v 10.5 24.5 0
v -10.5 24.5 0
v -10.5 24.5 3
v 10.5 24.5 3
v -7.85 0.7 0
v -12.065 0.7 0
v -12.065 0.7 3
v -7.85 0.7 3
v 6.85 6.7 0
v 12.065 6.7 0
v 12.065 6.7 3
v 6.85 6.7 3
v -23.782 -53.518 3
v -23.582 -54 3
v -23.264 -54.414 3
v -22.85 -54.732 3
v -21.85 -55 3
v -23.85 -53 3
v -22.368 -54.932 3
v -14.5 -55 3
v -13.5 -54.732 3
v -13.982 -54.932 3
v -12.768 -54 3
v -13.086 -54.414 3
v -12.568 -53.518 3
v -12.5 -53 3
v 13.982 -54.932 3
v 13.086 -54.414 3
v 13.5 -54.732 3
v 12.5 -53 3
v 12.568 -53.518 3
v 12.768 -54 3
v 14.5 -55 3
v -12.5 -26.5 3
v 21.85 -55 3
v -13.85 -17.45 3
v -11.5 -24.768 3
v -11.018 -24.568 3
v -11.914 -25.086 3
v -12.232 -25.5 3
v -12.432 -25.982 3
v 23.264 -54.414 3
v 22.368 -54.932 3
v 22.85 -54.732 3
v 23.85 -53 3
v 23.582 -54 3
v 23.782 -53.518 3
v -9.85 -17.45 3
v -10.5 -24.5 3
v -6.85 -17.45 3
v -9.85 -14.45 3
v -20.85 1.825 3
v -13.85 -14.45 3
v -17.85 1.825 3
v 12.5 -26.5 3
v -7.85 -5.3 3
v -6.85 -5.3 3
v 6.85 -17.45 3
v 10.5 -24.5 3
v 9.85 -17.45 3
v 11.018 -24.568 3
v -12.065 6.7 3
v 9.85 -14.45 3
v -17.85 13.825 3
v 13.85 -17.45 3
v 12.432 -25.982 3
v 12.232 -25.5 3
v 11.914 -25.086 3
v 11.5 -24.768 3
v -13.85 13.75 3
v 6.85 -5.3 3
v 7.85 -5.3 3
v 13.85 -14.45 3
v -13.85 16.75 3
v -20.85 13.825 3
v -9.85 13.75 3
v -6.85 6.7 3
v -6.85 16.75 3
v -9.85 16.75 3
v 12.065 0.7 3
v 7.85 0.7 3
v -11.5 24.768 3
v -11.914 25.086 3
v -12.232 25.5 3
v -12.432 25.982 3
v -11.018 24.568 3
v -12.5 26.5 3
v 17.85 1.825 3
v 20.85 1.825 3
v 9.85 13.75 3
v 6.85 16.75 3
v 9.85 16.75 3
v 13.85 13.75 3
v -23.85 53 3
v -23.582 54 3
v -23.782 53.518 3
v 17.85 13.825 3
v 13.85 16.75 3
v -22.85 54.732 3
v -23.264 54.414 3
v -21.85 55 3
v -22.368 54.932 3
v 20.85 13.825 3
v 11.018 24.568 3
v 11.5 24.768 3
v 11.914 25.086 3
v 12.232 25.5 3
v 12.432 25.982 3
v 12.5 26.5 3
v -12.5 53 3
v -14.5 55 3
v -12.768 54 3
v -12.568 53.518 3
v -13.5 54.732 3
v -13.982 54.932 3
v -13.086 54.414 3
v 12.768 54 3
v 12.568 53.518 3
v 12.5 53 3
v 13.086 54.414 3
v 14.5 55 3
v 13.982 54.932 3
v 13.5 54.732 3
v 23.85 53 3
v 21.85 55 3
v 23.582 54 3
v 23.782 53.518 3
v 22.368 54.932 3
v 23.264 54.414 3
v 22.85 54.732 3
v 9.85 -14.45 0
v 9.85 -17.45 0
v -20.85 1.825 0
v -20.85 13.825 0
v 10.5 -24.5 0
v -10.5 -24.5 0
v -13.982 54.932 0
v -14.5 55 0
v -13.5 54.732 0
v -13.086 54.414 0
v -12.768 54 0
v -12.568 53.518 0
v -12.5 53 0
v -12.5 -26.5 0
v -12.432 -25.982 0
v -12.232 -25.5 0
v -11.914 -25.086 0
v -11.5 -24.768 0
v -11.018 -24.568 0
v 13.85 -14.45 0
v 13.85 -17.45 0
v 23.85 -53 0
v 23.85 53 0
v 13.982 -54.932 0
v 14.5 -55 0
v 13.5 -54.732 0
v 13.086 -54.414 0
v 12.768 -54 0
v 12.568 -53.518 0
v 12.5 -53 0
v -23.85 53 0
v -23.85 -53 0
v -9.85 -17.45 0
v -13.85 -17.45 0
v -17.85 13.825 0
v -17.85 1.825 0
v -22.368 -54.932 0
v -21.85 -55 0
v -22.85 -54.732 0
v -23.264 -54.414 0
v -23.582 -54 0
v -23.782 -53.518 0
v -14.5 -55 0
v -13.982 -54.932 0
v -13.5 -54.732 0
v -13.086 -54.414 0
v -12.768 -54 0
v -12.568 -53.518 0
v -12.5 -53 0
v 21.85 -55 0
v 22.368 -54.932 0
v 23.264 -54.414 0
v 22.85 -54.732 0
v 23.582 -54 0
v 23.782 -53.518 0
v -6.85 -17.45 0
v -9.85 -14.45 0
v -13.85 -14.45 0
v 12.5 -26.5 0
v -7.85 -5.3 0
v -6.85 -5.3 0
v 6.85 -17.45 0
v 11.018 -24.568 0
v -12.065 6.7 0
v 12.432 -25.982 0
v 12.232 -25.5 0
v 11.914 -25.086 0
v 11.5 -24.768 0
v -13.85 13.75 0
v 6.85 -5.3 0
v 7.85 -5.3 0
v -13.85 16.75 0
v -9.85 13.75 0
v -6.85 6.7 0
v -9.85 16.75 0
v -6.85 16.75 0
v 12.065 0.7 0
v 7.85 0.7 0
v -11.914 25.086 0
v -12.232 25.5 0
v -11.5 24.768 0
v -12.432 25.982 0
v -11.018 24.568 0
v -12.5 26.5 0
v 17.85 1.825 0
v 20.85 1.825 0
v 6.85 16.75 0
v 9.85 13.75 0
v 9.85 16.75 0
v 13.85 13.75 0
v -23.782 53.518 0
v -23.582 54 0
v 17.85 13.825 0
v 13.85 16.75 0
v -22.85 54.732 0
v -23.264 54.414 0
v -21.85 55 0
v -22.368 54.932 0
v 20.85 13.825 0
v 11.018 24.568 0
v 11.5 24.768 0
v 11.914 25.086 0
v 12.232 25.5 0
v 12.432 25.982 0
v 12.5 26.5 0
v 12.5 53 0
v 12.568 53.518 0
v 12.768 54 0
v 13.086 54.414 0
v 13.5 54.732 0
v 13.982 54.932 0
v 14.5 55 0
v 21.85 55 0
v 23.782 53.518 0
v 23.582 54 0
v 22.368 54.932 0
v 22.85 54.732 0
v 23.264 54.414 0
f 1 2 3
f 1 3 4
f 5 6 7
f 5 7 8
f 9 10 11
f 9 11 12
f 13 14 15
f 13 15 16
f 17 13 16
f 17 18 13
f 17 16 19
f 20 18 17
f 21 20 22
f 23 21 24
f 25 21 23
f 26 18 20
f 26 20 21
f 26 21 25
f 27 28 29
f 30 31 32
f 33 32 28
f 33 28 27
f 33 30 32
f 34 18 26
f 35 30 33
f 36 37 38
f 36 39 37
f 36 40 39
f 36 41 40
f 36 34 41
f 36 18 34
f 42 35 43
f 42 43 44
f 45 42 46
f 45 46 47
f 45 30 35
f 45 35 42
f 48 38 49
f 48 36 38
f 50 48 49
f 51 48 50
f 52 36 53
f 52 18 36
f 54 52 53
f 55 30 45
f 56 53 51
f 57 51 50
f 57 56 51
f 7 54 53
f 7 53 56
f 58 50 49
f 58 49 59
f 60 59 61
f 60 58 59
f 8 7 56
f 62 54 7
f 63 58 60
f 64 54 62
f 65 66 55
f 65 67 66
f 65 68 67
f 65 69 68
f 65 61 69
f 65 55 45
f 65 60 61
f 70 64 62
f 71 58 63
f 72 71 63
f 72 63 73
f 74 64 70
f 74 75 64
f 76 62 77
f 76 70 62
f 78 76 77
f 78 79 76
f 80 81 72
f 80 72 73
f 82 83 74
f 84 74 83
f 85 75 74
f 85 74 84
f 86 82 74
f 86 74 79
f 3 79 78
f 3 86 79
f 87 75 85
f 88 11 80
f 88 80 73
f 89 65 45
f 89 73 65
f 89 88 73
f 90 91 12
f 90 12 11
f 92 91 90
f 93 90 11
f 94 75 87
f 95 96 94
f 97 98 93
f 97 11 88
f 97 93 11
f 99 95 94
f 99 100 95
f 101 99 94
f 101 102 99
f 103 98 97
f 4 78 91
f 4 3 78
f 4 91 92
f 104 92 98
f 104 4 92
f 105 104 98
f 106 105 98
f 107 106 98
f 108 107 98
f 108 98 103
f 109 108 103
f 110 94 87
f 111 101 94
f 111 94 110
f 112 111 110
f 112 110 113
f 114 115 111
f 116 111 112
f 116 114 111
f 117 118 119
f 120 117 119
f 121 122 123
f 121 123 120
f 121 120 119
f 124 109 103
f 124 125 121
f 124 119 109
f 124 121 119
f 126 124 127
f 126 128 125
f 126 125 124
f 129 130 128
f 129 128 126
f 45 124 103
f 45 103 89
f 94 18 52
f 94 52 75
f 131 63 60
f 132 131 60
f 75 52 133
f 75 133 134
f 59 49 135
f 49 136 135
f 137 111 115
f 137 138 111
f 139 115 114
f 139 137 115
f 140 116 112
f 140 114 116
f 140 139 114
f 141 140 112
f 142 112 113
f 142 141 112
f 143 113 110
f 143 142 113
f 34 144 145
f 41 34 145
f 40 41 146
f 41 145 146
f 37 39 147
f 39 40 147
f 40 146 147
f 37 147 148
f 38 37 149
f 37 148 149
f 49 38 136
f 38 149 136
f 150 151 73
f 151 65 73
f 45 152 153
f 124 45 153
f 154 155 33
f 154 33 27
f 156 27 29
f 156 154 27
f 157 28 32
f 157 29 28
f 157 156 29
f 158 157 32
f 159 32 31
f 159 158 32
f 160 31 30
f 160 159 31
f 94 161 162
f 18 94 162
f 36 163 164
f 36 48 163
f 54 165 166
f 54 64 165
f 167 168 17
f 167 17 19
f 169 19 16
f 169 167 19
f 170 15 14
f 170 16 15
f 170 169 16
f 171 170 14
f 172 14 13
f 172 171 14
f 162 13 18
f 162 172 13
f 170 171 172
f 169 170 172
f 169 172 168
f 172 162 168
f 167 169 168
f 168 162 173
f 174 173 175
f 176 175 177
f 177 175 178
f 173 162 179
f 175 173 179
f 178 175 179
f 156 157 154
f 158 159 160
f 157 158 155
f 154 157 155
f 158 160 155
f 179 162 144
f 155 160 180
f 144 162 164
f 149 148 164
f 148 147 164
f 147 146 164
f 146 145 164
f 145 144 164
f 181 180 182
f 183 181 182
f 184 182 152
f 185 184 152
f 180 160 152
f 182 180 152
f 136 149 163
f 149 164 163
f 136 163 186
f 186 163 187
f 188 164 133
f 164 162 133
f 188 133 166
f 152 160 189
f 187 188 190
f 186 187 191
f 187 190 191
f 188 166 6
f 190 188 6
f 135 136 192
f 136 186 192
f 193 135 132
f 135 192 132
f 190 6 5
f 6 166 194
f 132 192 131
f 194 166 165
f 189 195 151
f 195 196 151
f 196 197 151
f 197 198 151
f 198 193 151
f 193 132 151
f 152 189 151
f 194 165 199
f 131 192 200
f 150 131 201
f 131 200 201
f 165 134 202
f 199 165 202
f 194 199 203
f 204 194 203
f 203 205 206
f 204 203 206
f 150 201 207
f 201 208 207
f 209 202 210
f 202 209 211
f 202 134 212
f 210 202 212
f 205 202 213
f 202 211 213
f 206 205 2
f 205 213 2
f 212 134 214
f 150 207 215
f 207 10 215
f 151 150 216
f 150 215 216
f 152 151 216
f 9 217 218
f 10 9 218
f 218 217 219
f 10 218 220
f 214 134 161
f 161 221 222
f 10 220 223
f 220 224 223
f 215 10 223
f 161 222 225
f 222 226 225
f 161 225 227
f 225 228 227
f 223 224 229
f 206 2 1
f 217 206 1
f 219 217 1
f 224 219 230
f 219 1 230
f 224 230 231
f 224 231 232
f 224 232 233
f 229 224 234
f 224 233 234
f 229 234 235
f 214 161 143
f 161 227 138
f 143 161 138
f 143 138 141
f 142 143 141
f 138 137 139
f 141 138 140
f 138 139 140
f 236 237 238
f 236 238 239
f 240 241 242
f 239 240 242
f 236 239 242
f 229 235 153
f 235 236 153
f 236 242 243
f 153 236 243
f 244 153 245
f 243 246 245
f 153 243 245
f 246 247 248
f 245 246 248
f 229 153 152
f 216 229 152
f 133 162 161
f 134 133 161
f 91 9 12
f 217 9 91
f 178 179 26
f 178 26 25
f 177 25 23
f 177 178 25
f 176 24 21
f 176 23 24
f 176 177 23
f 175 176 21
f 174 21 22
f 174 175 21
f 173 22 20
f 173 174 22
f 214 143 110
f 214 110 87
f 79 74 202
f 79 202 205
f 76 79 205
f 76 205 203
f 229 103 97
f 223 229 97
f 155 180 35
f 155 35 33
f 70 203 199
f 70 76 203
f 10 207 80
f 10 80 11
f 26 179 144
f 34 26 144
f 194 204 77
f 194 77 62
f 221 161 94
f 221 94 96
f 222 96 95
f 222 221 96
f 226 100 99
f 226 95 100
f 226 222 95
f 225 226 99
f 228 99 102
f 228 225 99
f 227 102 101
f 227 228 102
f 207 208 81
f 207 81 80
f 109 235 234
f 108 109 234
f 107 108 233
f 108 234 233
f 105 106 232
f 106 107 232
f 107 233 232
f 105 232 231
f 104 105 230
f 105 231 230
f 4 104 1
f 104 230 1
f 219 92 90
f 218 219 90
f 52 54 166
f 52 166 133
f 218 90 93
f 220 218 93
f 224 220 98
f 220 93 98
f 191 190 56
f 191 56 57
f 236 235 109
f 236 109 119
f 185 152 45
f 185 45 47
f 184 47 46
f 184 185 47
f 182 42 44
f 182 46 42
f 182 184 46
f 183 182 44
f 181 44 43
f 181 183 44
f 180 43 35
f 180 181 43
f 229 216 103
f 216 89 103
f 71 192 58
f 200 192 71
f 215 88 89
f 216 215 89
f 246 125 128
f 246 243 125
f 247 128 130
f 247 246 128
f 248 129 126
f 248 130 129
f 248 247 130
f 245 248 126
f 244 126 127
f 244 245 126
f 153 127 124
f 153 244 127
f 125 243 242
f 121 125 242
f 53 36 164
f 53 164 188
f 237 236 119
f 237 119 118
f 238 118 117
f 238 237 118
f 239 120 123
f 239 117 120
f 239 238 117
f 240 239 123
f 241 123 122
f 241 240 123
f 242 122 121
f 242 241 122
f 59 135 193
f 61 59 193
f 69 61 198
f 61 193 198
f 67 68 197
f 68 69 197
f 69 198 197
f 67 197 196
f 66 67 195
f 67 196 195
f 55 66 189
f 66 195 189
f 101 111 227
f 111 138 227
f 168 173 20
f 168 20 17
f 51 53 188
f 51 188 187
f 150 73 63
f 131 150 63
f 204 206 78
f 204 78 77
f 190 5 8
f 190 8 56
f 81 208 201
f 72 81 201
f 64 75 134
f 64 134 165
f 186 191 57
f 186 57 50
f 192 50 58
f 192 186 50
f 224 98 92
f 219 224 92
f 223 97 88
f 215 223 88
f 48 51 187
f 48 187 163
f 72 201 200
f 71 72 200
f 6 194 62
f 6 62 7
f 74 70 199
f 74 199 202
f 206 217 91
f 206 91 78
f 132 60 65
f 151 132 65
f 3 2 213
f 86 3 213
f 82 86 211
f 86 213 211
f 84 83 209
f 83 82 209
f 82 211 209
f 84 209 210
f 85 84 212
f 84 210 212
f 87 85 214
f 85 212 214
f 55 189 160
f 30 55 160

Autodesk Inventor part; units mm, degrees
ref_plane "YZ Plane" through (0, 0, 0) normal (1, 0, 0) x (0, 1, 0)
ref_plane "XZ Plane" through (0, 0, 0) normal (0, 1, 0) x (-1, 0, 0)
ref_plane "XY Plane" through (0, 0, 0) normal (0, 0, 1) x (1, 0, 0)
sketch "草圖1" plane through (0, 0, 0) normal (0, 0, 1) x (1, 0, 0)
  line L0 (-23.85, -55) -> (23.85, 55) construction
  line L1 (23.85, -55) -> (-23.85, 55) construction
  line L2 (0, 127.5618) -> (0, -161.5218) construction
  line L3 (-23.85, 53) -> (-23.85, -53)
  line L4 (23.85, -53) -> (23.85, 53)
  line L5 (-10.5, 24.5) -> (10.5, 24.5)
  line L6 (12.5, 26.5) -> (12.5, 53)
  line L7 (-12.5, 53) -> (-12.5, 26.5)
  line L8 (-12.5, 24.5) -> (12.5, 55) construction
  line L9 (12.5, 24.5) -> (-12.5, 55) construction
  line L10 (21.85, 55) -> (14.5, 55)
  line L11 (-14.5, 55) -> (-21.85, 55)
  arc A0 (-12.5, 53) -> (-14.5, 55) centre (-14.5, 53) ccw
  arc A1 (14.5, 55) -> (12.5, 53) centre (14.5, 53) ccw
  arc A2 (-12.5, 26.5) -> (-10.5, 24.5) centre (-10.5, 26.5) ccw
  arc A3 (10.5, 24.5) -> (12.5, 26.5) centre (10.5, 26.5) ccw
  arc A4 (-21.85, 55) -> (-23.85, 53) centre (-21.85, 53) ccw
  arc A5 (23.85, 53) -> (21.85, 55) centre (21.85, 53) ccw
  line L12 (-82.8249, 0) -> (86.4934, 0) construction
  line L13 (-10.5, -24.5) -> (10.5, -24.5)
  line L14 (12.5, -26.5) -> (12.5, -53)
  line L15 (-12.5, -53) -> (-12.5, -26.5)
  line L16 (-12.5, -24.5) -> (12.5, -55) construction
  line L17 (12.5, -24.5) -> (-12.5, -55) construction
  line L18 (21.85, -55) -> (14.5, -55)
  line L19 (-14.5, -55) -> (-21.85, -55)
  arc A6 (-14.5, -55) -> (-12.5, -53) centre (-14.5, -53) ccw
  arc A7 (12.5, -53) -> (14.5, -55) centre (14.5, -53) ccw
  arc A8 (-10.5, -24.5) -> (-12.5, -26.5) centre (-10.5, -26.5) ccw
  arc A9 (12.5, -26.5) -> (10.5, -24.5) centre (10.5, -26.5) ccw
  arc A10 (-23.85, -53) -> (-21.85, -55) centre (-21.85, -53) ccw
  arc A11 (21.85, -55) -> (23.85, -53) centre (21.85, -53) ccw
  line L20 (-21.85, -55) -> (-14.5, -55)
  line L21 (14.5, -55) -> (21.85, -55)
  line L22 (-6.85, -17.45) -> (6.85, -17.45)
  line L23 (6.85, 16.75) -> (-6.85, 16.75)
  line L24 (12.065, 0.7) -> (12.065, 6.7)
  line L25 (-12.065, 6.7) -> (-12.065, 0.7)
  line L26 (-12.065, 0.7) -> (12.065, 6.7) construction
  line L27 (12.065, 0.7) -> (-12.065, 6.7) construction
  line L28 (-6.85, 16.75) -> (-6.85, 6.7)
  line L29 (6.85, 6.7) -> (6.85, 16.75)
  line L30 (12.065, 6.7) -> (6.85, 6.7)
  line L31 (7.85, 0.7) -> (12.065, 0.7)
  line L32 (-12.065, 0.7) -> (-7.85, 0.7)
  line L33 (-6.85, 6.7) -> (-12.065, 6.7)
  line L34 (-7.85, 0.7) -> (-7.85, -5.3)
  line L35 (-7.85, -5.3) -> (-6.85, -5.3)
  line L36 (-6.85, -5.3) -> (-6.85, -17.45)
  line L37 (7.85, 0.7) -> (7.85, -5.3)
  line L38 (7.85, -5.3) -> (6.85, -5.3)
  line L39 (6.85, -17.45) -> (6.85, -5.3)
  point P0 (0, 0)
  point P1 (0, 39.75)
  point P2 (0, -39.75)
  point P3 (0, 3.7)
  point P4 (12.065, 3.7)
  point P5 (-23.85, -53)
  dimension "d0" = 47.7
  dimension "d22" = 25
  dimension "d24" = 2
  dimension "d25" = 2
  dimension "d26" = 34.2
  dimension "d27" = 13.7
  dimension "d28" = 6
  dimension "d30" = 24.13
  dimension "d31" = 10.05
  dimension "d97" = 6
  dimension "d98" = 1
  dimension "d101" = 0.7
  dimension "d103" = 110
  dimension "d104" = 7.75
extrude "擠出1" add sketch "草圖1" along normal blind 3
sketch "草圖3" plane through (0, 0, 3) normal (0, 0, 1) x (1, 0, 0)
  line L0 (-88.1264, 0) -> (75.7938, 0)
  line L1 (0, 123.8394) -> (0, -129.4918)
  point P0 (0, 0)
sketch "草圖5" plane through (0, 0, 3) normal (0, 0, 1) x (1, 0, 0)
  line L0 (-9.85, -17.45) -> (-13.85, -17.45)
  line L1 (-13.85, -17.45) -> (-13.85, -14.45)
  line L2 (-13.85, -14.45) -> (-9.85, -14.45)
  line L3 (-9.85, -14.45) -> (-9.85, -17.45)
  line L4 (6.85, -17.45) -> (-6.85, -17.45) projected
  line L5 (-9.85, 13.75) -> (-13.85, 13.75)
  line L6 (-13.85, 13.75) -> (-13.85, 16.75)
  line L7 (-13.85, 16.75) -> (-9.85, 16.75)
  line L8 (-9.85, 16.75) -> (-9.85, 13.75)
  line L9 (-6.85, 16.75) -> (6.85, 16.75) projected
  line L10 (0, 31.1544) -> (0, -25.4134)
  line L11 (9.85, -17.45) -> (13.85, -17.45)
  line L12 (13.85, -17.45) -> (13.85, -14.45)
  line L13 (13.85, -14.45) -> (9.85, -14.45)
  line L14 (9.85, -14.45) -> (9.85, -17.45)
  line L15 (13.85, 16.75) -> (9.85, 16.75)
  line L16 (13.85, 13.75) -> (13.85, 16.75)
  line L17 (9.85, 13.75) -> (13.85, 13.75)
  line L18 (9.85, 16.75) -> (9.85, 13.75)
  line L19 (-17.85, 1.825) -> (-20.85, 1.825)
  line L20 (-20.85, 1.825) -> (-20.85, 13.825)
  line L21 (-20.85, 13.825) -> (-17.85, 13.825)
  line L22 (-17.85, 13.825) -> (-17.85, 1.825)
  line L23 (17.85, 1.825) -> (20.85, 1.825)
  line L24 (20.85, 1.825) -> (20.85, 13.825)
  line L25 (20.85, 13.825) -> (17.85, 13.825)
  line L26 (17.85, 13.825) -> (17.85, 1.825)
  line L27 (-6.85, -17.45) -> (-6.85, 16.75) construction
  point P0 (0, 0)
  dimension "d60" = 4
  dimension "d62" = 3
  dimension "d64" = 3
  dimension "d66" = 3
  dimension "d67" = 12
  dimension "d96" = 3
  dimension "d100" = 11
  dimension "d102" = 0.075
extrude "擠出4" cut sketch "草圖5" against normal up to next
properties part number "main_frame" material "木材 (楓木)"
